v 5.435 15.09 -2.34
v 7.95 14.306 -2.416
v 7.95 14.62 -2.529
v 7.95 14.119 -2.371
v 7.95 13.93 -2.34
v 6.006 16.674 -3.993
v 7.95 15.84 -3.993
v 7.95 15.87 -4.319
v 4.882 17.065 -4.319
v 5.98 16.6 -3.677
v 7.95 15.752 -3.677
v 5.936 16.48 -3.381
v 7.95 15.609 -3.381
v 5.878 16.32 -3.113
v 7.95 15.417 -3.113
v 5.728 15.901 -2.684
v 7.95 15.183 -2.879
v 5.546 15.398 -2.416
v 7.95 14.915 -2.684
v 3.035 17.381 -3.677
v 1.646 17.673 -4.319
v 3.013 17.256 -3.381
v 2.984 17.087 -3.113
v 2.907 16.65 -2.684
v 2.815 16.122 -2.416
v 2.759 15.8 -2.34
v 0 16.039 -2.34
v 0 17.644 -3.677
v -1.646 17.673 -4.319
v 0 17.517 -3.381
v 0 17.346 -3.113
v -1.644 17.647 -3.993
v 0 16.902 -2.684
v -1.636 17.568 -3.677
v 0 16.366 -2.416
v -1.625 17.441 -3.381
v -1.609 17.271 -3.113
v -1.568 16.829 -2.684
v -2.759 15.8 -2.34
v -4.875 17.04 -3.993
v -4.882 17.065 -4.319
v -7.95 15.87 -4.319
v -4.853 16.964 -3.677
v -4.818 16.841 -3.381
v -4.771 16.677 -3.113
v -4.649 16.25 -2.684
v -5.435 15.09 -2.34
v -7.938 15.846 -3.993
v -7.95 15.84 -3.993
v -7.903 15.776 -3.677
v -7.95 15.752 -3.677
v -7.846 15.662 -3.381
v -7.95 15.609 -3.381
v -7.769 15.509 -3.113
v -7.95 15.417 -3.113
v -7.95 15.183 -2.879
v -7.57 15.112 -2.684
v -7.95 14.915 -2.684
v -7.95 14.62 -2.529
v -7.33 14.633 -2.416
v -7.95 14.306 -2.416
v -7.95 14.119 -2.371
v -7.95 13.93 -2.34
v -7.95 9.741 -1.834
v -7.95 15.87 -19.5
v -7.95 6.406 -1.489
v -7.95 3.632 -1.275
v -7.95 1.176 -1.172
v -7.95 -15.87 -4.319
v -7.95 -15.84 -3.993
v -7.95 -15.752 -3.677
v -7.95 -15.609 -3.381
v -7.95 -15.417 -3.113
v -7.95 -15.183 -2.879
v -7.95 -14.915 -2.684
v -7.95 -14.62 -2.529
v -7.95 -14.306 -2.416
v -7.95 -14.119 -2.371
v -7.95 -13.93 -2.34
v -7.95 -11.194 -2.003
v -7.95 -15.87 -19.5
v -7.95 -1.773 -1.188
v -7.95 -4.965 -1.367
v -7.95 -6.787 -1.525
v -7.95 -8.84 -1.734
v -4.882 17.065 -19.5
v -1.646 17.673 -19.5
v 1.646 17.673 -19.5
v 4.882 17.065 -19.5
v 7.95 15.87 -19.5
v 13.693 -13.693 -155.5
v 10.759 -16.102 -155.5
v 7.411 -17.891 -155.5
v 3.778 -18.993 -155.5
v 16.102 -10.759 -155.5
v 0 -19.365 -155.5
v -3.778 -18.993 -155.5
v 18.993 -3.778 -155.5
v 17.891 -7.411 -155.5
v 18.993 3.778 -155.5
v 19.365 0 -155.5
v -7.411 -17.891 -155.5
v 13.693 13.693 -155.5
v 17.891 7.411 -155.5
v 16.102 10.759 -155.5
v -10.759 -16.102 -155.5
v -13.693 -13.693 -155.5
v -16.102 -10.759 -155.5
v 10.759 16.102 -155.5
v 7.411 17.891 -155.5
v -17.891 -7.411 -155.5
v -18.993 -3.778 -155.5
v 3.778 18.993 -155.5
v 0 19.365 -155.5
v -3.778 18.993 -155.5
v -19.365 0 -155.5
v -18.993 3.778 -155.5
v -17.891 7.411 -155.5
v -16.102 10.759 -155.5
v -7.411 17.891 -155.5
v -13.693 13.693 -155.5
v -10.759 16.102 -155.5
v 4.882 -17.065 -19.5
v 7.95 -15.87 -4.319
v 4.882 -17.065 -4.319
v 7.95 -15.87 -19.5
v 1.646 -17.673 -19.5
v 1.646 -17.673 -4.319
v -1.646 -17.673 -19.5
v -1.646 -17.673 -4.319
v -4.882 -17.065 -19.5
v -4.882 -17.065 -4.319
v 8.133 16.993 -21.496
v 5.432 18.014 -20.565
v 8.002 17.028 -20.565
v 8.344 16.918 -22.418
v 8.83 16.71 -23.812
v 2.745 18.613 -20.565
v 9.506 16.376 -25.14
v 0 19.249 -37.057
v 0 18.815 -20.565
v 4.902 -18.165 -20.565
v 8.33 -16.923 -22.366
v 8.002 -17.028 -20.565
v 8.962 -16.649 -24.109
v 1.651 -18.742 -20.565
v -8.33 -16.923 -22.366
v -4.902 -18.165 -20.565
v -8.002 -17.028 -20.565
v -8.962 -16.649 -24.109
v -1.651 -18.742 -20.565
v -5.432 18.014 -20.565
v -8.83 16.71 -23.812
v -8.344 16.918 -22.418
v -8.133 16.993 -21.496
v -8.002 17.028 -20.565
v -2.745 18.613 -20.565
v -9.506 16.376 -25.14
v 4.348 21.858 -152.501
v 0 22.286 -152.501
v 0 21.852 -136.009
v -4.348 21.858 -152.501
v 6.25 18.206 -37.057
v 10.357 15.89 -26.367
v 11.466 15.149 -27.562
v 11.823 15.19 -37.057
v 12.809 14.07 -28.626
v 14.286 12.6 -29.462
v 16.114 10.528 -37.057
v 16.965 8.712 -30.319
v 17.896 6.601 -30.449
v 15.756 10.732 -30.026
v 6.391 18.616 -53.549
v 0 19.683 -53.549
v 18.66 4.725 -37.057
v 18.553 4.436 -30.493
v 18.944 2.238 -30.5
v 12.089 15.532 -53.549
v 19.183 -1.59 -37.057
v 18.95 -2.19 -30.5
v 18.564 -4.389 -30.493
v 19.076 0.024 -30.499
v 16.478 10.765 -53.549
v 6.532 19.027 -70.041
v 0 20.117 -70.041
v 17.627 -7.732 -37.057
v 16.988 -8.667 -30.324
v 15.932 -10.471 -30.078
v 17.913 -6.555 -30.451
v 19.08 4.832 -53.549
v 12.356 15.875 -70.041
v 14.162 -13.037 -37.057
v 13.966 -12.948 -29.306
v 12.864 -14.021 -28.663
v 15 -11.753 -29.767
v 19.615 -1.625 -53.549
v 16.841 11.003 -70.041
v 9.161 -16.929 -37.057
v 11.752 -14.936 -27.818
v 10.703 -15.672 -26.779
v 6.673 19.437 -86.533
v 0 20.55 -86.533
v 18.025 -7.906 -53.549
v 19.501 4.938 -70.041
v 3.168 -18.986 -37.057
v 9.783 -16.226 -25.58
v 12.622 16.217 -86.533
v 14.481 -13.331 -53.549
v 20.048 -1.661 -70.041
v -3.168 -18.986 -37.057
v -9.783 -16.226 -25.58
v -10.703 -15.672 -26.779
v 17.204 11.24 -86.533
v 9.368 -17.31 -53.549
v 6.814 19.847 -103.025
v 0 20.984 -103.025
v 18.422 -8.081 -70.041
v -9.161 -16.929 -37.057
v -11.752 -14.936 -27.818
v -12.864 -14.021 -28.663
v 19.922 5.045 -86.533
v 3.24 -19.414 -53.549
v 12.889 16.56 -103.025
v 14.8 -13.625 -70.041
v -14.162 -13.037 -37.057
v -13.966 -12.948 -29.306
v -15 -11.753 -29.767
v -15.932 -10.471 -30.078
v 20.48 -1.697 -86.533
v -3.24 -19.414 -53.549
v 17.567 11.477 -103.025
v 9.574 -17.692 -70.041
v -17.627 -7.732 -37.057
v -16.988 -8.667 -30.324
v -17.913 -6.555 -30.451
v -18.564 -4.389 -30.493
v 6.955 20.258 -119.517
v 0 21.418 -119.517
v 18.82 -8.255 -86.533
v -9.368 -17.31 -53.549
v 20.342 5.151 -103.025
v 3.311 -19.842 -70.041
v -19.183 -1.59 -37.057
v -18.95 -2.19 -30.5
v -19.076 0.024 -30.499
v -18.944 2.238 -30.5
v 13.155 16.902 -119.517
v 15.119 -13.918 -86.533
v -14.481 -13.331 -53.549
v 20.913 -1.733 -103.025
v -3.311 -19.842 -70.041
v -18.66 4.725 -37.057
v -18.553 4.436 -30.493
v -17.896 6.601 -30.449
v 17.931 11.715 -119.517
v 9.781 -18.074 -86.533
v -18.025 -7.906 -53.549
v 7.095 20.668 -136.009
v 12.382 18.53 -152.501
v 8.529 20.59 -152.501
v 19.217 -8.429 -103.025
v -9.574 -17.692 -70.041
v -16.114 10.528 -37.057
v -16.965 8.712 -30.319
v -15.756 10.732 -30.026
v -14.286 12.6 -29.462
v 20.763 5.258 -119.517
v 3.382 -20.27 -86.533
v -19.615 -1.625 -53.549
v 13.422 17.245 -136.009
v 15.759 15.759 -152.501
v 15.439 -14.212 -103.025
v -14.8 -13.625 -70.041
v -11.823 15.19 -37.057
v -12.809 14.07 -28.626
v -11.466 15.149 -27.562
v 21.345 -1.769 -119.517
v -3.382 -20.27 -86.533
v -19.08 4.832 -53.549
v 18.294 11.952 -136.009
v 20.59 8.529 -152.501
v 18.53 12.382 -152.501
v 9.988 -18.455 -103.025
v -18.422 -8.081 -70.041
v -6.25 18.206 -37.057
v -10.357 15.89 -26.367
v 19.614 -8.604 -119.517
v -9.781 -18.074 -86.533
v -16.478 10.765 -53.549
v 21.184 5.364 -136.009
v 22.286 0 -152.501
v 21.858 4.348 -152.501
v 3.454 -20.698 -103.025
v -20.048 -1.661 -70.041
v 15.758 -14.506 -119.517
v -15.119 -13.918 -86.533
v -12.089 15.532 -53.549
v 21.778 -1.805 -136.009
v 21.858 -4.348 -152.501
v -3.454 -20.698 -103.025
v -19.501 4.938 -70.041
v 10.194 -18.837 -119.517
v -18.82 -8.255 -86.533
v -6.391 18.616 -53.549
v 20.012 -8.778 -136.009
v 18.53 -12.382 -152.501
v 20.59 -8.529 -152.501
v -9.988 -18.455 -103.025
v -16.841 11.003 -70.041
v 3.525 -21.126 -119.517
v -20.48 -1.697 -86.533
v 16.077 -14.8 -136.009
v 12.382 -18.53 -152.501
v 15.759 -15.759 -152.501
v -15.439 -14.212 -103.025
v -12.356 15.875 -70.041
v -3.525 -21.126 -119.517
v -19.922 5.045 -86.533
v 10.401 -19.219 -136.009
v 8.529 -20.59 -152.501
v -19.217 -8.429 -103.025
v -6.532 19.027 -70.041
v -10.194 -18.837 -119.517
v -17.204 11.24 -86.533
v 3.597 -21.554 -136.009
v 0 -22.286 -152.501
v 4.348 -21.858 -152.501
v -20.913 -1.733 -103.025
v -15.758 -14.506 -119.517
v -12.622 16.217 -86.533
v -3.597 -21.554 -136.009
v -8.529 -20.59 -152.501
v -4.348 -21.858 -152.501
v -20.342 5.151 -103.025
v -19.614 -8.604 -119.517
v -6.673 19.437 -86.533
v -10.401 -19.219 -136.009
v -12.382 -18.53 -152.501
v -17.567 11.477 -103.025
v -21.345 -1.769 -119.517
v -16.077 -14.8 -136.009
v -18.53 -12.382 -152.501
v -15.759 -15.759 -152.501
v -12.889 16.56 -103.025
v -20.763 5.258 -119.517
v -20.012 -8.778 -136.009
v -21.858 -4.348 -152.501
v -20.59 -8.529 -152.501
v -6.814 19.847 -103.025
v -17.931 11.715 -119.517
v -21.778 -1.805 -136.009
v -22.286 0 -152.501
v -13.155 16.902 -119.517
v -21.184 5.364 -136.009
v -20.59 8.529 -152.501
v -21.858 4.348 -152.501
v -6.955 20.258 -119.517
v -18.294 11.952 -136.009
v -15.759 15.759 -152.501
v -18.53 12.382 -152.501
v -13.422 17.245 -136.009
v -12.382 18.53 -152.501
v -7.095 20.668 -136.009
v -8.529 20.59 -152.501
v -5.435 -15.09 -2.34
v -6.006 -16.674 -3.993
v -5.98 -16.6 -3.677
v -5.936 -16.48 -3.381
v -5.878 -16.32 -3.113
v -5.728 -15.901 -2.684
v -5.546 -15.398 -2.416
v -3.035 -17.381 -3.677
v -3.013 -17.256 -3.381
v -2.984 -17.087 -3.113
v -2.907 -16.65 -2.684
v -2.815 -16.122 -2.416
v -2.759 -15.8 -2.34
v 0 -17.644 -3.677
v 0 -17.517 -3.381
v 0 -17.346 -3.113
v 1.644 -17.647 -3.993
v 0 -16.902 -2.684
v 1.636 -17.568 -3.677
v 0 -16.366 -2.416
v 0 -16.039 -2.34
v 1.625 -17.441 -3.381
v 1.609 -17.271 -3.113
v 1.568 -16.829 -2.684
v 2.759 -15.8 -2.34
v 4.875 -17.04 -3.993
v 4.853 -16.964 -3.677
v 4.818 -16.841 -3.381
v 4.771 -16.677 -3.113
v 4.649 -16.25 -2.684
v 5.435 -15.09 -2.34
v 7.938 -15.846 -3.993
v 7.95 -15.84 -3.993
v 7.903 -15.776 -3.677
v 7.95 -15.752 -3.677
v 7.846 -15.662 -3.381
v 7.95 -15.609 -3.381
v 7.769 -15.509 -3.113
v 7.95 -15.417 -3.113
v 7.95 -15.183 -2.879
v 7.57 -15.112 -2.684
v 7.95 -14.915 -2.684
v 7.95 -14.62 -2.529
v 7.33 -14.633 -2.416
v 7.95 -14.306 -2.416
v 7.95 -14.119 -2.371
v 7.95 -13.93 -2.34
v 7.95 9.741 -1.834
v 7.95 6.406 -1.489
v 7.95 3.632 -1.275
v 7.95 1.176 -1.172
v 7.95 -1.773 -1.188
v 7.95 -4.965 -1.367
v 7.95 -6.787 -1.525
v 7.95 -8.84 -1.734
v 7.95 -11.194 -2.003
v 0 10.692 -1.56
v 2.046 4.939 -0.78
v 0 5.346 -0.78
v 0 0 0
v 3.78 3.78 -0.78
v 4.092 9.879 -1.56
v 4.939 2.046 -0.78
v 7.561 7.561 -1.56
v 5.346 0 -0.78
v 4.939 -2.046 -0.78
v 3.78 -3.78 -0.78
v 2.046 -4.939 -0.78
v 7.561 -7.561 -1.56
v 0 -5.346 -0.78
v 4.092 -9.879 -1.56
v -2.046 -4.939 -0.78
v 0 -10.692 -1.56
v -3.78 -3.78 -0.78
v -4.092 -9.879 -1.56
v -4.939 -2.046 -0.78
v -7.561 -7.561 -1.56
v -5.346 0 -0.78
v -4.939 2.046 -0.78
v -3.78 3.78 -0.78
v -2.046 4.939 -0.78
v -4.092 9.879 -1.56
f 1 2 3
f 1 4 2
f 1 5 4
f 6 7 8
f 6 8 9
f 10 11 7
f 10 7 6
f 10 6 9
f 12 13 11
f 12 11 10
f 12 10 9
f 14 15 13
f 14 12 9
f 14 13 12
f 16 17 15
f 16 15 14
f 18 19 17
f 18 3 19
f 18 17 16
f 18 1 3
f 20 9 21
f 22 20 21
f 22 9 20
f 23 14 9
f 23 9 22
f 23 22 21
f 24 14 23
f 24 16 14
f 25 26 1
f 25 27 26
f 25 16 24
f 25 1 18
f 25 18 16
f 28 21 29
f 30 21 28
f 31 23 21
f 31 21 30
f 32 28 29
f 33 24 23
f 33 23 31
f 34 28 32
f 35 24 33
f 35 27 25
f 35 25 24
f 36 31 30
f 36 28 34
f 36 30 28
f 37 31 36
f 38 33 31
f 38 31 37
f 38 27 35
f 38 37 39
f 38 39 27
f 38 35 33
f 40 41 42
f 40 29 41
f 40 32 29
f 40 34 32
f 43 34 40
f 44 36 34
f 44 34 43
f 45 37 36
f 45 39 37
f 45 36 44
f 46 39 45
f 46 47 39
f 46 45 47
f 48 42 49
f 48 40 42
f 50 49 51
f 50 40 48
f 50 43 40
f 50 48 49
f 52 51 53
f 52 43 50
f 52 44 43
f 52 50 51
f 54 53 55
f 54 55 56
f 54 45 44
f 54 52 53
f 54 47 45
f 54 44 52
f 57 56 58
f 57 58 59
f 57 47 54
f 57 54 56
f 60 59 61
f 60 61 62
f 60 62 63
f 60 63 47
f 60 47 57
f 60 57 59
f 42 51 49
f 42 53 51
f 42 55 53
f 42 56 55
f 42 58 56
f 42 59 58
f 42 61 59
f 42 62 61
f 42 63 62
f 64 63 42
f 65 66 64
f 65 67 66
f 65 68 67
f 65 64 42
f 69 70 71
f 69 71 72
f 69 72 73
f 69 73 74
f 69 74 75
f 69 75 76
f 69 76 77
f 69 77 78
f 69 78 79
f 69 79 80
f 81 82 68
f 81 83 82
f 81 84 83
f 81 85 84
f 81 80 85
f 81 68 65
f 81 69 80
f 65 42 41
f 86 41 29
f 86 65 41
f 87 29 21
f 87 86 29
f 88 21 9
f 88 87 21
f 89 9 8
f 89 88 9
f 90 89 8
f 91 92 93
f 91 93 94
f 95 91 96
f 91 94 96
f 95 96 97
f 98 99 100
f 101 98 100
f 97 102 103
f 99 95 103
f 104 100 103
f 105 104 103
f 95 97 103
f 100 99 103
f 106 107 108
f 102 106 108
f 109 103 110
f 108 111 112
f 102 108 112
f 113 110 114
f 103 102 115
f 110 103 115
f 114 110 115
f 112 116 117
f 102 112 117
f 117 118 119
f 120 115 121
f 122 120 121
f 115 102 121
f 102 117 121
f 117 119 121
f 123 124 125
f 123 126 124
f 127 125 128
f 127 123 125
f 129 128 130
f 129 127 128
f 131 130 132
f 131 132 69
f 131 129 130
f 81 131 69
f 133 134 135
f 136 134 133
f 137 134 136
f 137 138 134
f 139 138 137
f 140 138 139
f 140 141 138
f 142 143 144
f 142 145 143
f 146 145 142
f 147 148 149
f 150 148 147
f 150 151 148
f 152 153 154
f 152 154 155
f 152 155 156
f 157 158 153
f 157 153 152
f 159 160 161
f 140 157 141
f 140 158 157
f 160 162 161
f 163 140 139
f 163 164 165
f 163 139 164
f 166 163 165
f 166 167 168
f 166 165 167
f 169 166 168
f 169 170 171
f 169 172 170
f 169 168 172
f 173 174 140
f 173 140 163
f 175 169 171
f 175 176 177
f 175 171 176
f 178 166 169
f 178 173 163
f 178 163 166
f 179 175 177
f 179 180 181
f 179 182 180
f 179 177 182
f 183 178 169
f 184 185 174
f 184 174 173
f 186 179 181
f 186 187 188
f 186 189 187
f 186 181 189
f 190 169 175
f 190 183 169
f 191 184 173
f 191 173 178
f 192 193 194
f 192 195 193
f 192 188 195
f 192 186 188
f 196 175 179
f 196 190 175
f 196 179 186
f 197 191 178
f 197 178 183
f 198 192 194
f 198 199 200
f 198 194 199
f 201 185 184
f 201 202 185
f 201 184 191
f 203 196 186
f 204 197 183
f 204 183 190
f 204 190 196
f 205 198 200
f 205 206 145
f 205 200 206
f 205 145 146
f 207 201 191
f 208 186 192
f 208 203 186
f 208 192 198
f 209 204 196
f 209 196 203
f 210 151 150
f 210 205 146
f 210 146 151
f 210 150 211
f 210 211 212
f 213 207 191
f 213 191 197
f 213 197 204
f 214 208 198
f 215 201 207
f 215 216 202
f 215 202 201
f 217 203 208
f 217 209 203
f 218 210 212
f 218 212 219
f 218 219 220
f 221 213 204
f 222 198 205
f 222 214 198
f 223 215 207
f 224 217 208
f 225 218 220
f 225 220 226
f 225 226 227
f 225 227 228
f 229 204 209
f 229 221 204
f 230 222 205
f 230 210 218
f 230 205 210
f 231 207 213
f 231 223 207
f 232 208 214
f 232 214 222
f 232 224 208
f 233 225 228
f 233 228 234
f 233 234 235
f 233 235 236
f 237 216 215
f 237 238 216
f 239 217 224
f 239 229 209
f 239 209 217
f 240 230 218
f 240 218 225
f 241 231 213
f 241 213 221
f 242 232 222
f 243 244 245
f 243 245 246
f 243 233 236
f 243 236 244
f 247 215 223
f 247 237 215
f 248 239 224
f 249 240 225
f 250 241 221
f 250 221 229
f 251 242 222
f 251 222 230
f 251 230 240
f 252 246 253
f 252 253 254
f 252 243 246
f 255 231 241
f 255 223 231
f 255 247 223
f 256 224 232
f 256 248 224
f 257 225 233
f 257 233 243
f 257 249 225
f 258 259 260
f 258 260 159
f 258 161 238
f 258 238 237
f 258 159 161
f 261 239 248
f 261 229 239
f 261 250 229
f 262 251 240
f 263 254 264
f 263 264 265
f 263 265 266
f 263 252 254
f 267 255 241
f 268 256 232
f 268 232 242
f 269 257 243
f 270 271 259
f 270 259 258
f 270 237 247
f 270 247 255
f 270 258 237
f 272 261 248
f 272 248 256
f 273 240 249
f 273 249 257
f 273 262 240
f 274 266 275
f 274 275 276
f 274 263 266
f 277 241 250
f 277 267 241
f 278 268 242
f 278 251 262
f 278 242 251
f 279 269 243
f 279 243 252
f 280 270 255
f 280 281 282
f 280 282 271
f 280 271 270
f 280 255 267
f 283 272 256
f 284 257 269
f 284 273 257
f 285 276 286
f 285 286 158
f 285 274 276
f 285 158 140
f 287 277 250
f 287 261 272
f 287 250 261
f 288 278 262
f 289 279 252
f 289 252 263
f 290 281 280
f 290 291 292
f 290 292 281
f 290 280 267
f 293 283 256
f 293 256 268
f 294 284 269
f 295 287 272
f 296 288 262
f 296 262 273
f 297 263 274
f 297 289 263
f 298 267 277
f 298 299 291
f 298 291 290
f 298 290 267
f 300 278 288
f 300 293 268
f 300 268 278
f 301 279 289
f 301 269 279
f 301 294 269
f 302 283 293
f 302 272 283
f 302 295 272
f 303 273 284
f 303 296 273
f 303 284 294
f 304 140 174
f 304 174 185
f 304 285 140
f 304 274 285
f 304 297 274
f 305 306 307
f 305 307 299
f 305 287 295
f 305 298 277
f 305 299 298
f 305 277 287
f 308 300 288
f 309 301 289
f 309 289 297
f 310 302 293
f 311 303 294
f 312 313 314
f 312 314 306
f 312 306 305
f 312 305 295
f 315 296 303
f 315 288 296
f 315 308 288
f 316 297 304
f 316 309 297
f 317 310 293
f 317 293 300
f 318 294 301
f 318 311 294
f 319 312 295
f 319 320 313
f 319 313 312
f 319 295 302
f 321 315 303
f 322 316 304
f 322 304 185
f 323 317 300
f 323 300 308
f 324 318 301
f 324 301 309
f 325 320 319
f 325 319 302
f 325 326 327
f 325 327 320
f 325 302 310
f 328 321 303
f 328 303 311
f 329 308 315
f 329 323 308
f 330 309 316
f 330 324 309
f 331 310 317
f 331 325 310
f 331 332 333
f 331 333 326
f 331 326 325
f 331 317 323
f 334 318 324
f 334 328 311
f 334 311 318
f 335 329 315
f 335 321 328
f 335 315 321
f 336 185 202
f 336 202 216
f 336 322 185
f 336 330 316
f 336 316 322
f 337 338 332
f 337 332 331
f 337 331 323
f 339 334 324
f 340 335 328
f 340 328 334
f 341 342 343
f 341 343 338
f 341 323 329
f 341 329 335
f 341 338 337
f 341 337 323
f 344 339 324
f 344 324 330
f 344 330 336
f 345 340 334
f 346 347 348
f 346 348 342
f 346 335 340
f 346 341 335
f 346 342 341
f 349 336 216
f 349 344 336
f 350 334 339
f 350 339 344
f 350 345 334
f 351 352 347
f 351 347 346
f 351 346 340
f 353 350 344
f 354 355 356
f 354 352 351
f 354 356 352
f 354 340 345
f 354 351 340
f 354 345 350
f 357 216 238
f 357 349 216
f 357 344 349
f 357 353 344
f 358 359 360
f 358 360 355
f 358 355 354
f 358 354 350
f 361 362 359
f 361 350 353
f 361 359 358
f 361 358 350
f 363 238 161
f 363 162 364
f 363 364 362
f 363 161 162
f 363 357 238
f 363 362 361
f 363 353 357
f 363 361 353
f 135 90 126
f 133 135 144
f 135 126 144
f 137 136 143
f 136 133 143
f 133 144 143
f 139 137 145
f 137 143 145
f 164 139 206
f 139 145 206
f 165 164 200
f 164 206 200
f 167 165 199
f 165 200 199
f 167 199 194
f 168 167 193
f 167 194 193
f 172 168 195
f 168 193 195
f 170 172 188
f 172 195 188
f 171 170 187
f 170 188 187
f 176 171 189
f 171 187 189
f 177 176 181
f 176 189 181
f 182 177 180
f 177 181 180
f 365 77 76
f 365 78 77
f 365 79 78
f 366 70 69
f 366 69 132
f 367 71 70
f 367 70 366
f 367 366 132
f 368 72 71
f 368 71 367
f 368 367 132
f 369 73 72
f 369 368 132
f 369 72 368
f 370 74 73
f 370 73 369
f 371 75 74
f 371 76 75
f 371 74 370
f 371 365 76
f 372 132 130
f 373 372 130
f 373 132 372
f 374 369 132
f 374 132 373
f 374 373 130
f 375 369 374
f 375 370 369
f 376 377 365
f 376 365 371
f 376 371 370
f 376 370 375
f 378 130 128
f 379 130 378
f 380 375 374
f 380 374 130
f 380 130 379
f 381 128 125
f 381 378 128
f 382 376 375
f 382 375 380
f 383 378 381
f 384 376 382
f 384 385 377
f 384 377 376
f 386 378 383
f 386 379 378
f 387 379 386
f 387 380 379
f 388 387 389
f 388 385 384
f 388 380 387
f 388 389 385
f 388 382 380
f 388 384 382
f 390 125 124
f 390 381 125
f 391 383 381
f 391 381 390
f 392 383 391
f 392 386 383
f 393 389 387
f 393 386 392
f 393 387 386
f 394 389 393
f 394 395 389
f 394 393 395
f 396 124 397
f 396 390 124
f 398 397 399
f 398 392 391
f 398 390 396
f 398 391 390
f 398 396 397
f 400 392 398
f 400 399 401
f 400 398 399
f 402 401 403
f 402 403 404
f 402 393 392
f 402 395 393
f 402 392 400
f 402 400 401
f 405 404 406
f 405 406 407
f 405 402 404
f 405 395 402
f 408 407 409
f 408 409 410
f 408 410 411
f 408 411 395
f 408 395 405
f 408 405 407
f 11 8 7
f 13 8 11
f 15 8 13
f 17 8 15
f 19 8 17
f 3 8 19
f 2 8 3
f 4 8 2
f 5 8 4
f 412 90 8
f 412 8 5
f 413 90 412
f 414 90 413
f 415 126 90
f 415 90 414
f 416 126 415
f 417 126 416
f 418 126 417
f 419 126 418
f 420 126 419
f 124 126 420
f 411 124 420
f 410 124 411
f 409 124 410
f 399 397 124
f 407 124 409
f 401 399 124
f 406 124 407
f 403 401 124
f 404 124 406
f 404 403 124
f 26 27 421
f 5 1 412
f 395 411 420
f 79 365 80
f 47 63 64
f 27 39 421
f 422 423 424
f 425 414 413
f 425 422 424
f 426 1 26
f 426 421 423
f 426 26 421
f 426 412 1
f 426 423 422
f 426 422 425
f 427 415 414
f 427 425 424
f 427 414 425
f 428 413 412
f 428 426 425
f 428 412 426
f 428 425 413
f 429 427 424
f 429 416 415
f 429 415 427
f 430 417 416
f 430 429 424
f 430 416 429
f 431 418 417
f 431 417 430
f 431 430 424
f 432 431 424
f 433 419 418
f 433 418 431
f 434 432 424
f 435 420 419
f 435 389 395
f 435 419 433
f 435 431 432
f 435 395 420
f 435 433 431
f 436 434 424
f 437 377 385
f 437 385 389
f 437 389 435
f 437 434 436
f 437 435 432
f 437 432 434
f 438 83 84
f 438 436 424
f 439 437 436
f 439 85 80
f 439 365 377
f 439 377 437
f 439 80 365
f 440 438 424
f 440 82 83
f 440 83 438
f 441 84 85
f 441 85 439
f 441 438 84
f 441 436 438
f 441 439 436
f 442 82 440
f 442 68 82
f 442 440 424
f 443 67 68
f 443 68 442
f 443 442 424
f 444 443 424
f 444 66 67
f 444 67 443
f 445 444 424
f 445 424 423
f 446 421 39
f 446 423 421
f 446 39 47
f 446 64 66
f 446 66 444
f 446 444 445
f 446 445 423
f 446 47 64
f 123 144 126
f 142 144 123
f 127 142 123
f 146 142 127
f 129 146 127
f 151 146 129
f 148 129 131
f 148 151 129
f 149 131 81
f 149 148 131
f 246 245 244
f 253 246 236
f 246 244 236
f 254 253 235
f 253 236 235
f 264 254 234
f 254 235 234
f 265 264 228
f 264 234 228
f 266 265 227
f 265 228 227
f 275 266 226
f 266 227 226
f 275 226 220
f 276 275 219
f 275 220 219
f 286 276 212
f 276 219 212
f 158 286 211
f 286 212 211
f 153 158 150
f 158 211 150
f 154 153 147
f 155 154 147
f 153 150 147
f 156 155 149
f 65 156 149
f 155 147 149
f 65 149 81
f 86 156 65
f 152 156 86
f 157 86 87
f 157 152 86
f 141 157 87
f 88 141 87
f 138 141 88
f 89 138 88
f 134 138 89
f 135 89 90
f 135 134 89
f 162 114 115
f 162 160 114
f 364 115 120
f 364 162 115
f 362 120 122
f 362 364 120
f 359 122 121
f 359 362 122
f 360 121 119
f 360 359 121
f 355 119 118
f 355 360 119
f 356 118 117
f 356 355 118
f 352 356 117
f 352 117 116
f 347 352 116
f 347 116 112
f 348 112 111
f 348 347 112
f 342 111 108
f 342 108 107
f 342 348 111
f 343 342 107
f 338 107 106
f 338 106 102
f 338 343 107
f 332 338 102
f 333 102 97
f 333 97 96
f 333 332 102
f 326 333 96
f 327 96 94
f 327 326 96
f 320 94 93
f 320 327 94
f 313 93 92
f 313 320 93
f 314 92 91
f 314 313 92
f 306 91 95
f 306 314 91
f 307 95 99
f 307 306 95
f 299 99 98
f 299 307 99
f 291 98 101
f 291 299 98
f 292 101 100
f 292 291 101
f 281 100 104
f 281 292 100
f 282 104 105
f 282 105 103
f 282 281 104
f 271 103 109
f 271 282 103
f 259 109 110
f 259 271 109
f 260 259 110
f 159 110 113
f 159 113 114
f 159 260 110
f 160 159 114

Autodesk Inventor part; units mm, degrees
ref_plane "YZ Plane" through (0, 0, 0) normal (1, 0, 0) x (0, 1, 0)
ref_plane "XZ Plane" through (0, 0, 0) normal (0, 1, 0) x (-1, 0, 0)
ref_plane "XY Plane" through (0, 0, 0) normal (0, 0, 1) x (1, 0, 0)
sketch "Sketch1" plane through (0, 0, 0) normal (1, 0, 0) x (0, 1, 0)
  line L0 (0, 0) -> (18.2735, 0) construction
  line L1 (18.2735, 0) -> (18.8146, -20.5646) construction
  line L2 (22.3653, -155.5) -> (0, -155.5)
  line L3 (0, -155.5) -> (0, 0)
  line L4 (0, -186.6) -> (0, 31.1) projected
  line L5 (22.1995, -149.2) -> (0, -149.2) construction
  line L6 (-4.4731, 0) -> (26.8383, 0) construction
  line L7 (0, 0) -> (16.0387, -2.3398)
  line L8 (17.75, -4.3188) -> (17.75, -19.5)
  line L9 (17.75, -19.5) -> (18.8146, -20.5646)
  line L10 (18.8146, -20.5646) -> (22.3653, -155.5)
  arc A0 (17.75, -4.3188) -> (16.0387, -2.3398) centre (15.75, -4.3188) ccw
  dimension "d0" = 155.5
  dimension "d1" = 36.547
  dimension "d2" = 44.399
  dimension "d3" = 149.2
  dimension "d4" = 19.5
  dimension "d5" = 35.5
  dimension "d6" = 45
  dimension "d7" = 8.3
  dimension "d8" = 2
revolve "Revolution1" add sketch "Sketch1" angle 360 about axis through (0, 0, -155.5) along (0, 0, 1)
chamfer "Chamfer1" distance 3 angle 45 1 edges at (0, -22.3653, -155.5)
sketch "Sketch3" plane through (0, 0, 0) normal (0, 1, 0) x (-1, 0, 0)
  line L0 (7.95, 0) -> (7.95, -19.5)
  arc A0 (7.95, -19.5) -> (19.5695, -30.4825) centre (18.95, -19.5) ccw
  line L1 (19.5695, -30.4825) -> (19.5695, 0)
  line L2 (19.5695, 0) -> (7.95, 0)
  line L3 (0, -186.6) -> (0, 31.1) projected
  line L4 (31.8888, 0) -> (-31.3156, 0) projected
  point P0 (0, 0)
  dimension "d19" = 15.9
  dimension "d20" = 30.5
  dimension "d21" = 11
extrude "Extrusion2" cut sketch "Sketch3" along normal through all both and the other way through all
mirror "Mirror2" about plane through (0, 0, 0) normal (1, 0, 0) of "Extrusion2"
properties material "Steel, Alloy"
